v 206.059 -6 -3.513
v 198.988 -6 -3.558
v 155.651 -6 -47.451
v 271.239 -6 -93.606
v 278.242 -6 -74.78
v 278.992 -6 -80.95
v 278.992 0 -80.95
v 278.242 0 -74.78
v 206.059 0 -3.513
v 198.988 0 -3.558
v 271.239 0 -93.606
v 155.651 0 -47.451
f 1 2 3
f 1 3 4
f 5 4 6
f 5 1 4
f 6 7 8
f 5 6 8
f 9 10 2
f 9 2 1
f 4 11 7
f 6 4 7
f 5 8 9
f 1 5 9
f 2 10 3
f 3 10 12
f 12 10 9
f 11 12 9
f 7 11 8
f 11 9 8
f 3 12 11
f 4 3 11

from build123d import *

# Parameters (mm, degrees)
F1_DEPTH    = 6
F2_T1_DEPTH = 31.7168298797
F2_T3_DEPTH = 26.6288680093


# Not quite as in the source:
# - a fillet or chamfer that OpenCascade refuses, or shapes differently, is made with other operations: its cross-section is extruded or revolved along the edge and cut away or added


with BuildPart() as f1:
    # F0 (on Front) → F1 (new body)
    with BuildSketch(Plane.XZ):
        Polygon((202.5005221367, 0), (155.6514501572, -47.4510490894), (271.2386846542, -93.6057344079), (281.0647502264, -77.5675406007), align=None)
    extrude(amount=F1_DEPTH)

    # F2: chamfer of 5 on 2 edges, made by hand

    # F2_s2 → F2_t1 (cut)
    with BuildSketch(Plane.XZ.offset(-12.8584149398)):
        Polygon((198.9876293479, -3.5580309518), (206.0585530885, -3.5128927888), (202.5005221367, 0), align=None)
    extrude(amount=F2_T1_DEPTH, mode=Mode.SUBTRACT)

    # F2_s4 → F2_t3 (cut)
    with BuildSketch(Plane.XZ.offset(-10.3144340046)):
        Polygon((278.9922098799, -80.9503598488), (278.2416469809, -74.7802520225), (281.0647502264, -77.5675406007), align=None)
    extrude(amount=F2_T3_DEPTH, mode=Mode.SUBTRACT)


solid = f1.part
